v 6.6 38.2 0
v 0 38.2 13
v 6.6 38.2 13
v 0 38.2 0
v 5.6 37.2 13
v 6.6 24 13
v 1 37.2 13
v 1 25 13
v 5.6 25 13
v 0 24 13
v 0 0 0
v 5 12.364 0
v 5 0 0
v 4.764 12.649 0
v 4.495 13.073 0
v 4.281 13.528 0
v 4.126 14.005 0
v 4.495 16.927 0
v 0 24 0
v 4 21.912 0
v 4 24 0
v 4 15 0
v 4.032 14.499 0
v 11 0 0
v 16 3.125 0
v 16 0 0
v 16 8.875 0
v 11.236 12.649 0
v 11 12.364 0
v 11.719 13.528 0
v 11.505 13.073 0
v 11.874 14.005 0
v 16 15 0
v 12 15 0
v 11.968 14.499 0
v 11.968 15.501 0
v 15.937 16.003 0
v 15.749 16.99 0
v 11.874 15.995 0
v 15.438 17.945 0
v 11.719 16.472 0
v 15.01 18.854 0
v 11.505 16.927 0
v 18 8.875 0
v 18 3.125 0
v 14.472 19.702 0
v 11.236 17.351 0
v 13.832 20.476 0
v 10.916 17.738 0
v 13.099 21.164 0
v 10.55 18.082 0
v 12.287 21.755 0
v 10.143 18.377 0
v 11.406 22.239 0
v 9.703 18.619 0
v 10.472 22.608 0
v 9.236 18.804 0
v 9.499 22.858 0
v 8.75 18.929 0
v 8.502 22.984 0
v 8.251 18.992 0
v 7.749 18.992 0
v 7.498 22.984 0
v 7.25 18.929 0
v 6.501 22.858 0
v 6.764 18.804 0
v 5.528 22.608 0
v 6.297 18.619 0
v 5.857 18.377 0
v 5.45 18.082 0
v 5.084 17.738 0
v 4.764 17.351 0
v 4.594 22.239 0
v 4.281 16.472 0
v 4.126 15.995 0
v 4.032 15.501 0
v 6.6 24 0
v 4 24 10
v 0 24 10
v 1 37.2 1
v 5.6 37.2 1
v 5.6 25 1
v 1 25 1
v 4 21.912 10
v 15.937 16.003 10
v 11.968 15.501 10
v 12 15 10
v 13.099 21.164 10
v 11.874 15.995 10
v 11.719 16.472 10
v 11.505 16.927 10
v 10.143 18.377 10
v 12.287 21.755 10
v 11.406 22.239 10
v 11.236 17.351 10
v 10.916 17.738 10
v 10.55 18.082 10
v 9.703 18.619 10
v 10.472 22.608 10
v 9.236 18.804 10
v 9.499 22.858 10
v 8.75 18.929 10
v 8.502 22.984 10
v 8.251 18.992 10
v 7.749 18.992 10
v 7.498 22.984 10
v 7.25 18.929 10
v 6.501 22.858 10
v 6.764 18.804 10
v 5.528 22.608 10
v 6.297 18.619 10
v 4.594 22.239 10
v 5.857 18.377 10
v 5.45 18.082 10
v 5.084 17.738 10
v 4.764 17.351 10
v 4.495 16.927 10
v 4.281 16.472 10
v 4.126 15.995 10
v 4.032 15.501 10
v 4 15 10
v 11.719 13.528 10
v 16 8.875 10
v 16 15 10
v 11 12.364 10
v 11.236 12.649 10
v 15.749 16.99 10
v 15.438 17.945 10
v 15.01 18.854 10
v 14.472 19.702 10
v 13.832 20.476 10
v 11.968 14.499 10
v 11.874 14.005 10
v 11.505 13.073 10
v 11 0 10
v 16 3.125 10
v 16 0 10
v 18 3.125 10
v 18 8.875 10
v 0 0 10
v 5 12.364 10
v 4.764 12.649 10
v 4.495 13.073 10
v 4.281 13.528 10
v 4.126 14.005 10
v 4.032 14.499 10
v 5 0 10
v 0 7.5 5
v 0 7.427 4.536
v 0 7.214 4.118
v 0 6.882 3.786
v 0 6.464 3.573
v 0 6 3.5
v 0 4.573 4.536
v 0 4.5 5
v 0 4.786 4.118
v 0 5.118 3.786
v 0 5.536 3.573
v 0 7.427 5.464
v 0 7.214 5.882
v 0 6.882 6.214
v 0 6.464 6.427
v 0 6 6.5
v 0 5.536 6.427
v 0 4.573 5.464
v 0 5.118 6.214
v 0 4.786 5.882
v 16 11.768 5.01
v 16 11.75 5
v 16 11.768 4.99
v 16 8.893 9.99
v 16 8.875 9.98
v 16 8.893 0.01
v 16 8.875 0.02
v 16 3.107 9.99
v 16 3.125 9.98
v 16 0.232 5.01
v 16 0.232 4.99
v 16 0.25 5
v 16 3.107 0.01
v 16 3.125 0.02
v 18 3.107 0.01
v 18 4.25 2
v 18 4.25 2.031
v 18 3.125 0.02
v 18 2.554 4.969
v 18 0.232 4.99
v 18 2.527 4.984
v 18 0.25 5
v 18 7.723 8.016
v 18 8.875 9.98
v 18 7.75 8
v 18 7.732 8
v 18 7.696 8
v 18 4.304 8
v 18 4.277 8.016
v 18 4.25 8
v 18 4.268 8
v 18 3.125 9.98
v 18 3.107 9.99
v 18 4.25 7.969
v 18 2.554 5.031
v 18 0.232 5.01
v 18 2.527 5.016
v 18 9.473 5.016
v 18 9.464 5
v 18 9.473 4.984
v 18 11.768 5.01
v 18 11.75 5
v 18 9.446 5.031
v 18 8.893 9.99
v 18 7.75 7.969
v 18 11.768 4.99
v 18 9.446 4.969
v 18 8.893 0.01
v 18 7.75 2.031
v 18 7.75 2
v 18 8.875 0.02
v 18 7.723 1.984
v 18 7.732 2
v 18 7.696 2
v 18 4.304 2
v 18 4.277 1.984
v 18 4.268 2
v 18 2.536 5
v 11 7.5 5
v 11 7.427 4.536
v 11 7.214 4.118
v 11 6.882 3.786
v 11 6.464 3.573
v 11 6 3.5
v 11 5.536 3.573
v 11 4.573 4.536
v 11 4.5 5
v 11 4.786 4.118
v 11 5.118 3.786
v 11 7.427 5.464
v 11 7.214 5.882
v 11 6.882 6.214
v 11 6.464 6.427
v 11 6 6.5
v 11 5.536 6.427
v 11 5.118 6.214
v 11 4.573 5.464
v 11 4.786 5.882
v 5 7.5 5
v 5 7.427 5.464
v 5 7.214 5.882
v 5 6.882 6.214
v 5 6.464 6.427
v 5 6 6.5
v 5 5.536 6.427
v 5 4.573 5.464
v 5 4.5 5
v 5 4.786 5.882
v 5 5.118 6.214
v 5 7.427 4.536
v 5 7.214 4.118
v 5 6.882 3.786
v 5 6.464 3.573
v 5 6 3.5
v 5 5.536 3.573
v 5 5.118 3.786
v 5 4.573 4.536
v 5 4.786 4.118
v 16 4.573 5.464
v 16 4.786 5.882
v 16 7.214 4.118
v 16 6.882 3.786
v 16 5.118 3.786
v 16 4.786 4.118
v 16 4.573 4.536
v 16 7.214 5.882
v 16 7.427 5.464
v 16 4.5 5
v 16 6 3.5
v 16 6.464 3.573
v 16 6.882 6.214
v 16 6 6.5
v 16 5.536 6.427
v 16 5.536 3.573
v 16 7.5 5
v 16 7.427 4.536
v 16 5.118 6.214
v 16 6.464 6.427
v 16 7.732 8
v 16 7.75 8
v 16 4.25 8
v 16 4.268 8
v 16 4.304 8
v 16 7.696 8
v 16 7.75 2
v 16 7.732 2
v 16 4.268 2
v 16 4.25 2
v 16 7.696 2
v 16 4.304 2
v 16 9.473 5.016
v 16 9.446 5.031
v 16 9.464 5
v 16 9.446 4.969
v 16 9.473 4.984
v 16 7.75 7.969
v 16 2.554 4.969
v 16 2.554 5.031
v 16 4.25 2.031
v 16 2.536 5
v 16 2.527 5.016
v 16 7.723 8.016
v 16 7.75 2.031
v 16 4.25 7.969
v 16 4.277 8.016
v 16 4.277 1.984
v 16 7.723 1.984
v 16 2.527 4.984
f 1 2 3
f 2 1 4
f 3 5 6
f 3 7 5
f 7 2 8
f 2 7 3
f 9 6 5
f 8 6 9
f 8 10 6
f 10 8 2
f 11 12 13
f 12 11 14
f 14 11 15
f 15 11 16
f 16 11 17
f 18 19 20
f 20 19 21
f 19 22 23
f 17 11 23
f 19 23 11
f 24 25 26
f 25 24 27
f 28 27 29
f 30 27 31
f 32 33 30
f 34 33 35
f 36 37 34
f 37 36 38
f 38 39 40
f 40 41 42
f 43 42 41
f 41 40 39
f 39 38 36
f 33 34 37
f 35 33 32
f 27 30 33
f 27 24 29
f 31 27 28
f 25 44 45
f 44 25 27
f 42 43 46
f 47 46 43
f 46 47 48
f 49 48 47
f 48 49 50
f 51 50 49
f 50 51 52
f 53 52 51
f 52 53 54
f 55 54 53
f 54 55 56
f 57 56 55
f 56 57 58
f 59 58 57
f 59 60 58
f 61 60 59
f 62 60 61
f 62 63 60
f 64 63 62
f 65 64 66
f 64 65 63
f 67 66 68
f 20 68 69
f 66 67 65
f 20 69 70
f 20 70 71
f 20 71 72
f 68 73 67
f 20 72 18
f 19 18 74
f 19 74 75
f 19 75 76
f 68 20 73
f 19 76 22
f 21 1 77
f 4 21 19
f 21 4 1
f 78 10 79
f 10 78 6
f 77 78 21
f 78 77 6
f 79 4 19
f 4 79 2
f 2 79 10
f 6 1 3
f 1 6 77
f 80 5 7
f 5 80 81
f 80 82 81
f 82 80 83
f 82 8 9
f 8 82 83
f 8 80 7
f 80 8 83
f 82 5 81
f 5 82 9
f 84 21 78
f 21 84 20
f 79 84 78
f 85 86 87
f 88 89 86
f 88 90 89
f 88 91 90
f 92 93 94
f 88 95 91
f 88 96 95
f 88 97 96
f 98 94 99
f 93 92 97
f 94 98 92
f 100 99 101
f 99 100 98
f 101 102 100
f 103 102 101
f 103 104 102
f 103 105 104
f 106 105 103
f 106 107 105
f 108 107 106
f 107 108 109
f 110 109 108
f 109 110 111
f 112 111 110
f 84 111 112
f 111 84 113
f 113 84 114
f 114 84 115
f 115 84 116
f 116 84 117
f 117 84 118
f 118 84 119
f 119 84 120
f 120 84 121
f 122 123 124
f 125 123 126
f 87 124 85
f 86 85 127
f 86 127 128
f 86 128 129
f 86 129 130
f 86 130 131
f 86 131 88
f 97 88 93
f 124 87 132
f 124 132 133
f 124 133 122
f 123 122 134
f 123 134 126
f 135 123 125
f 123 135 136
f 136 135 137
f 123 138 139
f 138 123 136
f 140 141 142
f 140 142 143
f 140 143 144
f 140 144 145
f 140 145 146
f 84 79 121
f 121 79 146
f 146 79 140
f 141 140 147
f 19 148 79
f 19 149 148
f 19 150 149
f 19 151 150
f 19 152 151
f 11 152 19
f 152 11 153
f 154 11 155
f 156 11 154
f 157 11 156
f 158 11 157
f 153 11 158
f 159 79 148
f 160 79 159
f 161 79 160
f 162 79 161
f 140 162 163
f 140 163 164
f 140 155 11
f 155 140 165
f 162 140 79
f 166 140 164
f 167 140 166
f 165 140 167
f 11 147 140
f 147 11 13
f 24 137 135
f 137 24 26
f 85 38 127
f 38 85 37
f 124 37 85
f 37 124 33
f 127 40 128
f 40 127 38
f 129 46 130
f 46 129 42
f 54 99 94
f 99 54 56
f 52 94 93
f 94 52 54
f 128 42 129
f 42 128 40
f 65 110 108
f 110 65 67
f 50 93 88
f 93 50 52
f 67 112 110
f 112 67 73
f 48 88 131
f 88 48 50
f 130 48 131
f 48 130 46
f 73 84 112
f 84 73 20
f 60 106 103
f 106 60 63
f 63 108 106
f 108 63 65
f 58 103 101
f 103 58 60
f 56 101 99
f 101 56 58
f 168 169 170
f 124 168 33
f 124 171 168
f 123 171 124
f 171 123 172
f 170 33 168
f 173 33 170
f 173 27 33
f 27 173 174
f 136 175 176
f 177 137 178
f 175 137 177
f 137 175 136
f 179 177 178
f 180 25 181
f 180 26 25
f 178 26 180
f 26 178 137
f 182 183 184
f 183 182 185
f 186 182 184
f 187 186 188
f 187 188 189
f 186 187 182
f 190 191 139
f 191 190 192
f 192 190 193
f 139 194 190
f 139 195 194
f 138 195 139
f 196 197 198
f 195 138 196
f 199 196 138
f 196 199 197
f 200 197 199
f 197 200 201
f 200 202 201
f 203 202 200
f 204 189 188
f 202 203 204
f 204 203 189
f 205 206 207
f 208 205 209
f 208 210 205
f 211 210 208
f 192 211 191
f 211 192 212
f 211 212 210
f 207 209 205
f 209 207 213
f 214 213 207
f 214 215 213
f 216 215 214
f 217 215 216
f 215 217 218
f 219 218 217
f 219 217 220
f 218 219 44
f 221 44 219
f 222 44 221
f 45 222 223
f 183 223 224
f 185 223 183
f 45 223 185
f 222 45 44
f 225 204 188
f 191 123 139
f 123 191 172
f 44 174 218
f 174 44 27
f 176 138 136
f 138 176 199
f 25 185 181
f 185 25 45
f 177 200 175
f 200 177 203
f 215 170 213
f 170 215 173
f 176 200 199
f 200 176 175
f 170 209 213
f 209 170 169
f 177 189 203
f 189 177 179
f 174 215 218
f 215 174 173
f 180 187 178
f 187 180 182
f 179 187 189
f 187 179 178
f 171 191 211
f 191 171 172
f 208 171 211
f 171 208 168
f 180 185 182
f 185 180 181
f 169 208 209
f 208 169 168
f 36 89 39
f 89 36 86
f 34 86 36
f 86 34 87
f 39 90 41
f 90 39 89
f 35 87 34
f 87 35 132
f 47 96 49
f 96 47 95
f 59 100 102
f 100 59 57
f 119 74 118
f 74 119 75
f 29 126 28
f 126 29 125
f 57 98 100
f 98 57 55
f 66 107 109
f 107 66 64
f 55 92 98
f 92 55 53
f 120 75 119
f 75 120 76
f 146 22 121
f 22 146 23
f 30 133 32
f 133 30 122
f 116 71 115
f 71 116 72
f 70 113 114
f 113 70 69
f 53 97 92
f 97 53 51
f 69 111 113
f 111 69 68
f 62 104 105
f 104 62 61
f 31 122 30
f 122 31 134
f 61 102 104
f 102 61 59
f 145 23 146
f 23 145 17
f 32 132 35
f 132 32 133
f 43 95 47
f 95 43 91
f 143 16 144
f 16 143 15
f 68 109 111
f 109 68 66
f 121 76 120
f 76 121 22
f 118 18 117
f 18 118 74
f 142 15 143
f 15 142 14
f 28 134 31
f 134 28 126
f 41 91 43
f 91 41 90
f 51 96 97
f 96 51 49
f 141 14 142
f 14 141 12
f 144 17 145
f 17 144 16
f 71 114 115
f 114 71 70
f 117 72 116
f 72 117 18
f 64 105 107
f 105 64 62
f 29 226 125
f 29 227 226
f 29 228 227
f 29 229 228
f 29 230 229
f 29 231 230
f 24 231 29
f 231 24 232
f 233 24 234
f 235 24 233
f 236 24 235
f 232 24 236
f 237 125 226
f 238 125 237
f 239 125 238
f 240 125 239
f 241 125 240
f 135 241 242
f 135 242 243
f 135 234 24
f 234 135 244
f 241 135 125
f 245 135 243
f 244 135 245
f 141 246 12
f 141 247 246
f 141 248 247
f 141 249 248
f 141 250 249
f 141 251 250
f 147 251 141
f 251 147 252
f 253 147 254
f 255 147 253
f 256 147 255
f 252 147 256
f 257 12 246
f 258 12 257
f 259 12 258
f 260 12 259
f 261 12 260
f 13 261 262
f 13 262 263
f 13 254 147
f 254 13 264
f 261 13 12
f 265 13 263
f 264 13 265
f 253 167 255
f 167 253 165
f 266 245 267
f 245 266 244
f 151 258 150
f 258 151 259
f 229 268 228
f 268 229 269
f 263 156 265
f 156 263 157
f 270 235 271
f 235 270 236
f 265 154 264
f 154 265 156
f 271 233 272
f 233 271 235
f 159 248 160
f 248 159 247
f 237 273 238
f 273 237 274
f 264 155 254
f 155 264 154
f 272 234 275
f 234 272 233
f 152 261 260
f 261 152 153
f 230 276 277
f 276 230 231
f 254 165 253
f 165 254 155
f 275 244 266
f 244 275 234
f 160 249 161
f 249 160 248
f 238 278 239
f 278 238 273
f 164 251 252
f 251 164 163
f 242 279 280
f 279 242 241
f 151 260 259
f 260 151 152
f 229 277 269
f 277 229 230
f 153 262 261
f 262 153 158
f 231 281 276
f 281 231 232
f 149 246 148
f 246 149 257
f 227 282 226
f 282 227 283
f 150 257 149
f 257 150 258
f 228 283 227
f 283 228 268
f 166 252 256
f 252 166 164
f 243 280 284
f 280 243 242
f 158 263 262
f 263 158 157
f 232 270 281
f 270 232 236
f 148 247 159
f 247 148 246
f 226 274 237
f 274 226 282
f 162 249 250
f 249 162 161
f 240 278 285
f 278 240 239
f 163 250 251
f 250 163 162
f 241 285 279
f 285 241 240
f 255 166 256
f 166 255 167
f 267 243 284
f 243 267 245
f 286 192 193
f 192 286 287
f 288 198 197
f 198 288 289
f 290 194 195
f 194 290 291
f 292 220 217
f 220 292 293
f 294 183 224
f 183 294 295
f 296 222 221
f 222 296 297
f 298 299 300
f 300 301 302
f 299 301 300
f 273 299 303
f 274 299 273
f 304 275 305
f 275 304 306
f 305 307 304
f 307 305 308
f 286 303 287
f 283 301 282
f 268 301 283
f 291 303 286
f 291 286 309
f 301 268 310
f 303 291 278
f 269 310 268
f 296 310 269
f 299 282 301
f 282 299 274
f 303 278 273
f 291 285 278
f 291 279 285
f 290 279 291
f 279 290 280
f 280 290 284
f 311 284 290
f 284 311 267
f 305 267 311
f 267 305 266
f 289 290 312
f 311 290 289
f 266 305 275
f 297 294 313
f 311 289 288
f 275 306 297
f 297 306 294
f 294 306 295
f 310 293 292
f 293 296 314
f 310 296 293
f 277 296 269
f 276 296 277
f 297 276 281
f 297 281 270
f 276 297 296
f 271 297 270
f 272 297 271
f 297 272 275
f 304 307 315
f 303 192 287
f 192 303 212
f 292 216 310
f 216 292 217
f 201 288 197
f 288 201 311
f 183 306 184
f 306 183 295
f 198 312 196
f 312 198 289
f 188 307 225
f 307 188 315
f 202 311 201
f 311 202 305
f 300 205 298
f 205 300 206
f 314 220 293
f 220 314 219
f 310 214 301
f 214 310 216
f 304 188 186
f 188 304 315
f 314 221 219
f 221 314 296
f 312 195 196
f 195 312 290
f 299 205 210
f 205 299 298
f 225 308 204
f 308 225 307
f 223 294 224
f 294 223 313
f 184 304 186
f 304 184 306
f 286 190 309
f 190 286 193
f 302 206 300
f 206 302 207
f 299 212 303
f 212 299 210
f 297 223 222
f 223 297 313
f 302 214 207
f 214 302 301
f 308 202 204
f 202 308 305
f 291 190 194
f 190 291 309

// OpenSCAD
// [FL_INDEX: keywords="openscad, 3d_parametric, USB_thumbdrive_holder_for_M8_rod, csg_solid" | COT="Parametric OpenSCAD design from 3DCodeverse"]
// Title: USB thumbdrive holder for M8 rod

extra=0.1;
H=12;
L=4.5+extra;
B=12.1+extra;
union(){
rotate([0,0,90])
translate([24,-(L+2),0])
difference()
{

cube([B+2,L+2,H+1]);
translate([1,1,1])
cube([B,L,H+2]);
}

difference() {
	union() {
		cube([4,24,10]);  //4,45,10
		translate([8, 15,0]) cylinder(h = 10, r = 8, $fn = 50);
		cube([16, 15,10]);
		
		translate([17,6,5]) cube([2,5.75,10], center=true);
		translate([17,6,5]) rotate(a=[60,0,0]) cube([2,5.75,10], center=true);
		translate([17,6,5]) rotate(a=[120,0,0]) cube([2,5.75,10], center=true);

	}
	translate([8, 15,0]) cylinder(h = 10, r = 4, $fn = 50);
	translate([5, 0, 0]) cube([6, 15,10]);
	translate([-10, 6, 5]) rotate(a=[0, 90, 0]) cylinder(h = 30, r = 1.5, $fn= 20);

	translate([17,6,5]) cube([2,3.5,6], center=true);
	translate([17,6,5]) rotate(a=[60,0,0]) cube([2,3.5,6], center=true);
	translate([17,6,5]) rotate(a=[120,0,0]) cube([2,3.5,6], center=true);
}
}
